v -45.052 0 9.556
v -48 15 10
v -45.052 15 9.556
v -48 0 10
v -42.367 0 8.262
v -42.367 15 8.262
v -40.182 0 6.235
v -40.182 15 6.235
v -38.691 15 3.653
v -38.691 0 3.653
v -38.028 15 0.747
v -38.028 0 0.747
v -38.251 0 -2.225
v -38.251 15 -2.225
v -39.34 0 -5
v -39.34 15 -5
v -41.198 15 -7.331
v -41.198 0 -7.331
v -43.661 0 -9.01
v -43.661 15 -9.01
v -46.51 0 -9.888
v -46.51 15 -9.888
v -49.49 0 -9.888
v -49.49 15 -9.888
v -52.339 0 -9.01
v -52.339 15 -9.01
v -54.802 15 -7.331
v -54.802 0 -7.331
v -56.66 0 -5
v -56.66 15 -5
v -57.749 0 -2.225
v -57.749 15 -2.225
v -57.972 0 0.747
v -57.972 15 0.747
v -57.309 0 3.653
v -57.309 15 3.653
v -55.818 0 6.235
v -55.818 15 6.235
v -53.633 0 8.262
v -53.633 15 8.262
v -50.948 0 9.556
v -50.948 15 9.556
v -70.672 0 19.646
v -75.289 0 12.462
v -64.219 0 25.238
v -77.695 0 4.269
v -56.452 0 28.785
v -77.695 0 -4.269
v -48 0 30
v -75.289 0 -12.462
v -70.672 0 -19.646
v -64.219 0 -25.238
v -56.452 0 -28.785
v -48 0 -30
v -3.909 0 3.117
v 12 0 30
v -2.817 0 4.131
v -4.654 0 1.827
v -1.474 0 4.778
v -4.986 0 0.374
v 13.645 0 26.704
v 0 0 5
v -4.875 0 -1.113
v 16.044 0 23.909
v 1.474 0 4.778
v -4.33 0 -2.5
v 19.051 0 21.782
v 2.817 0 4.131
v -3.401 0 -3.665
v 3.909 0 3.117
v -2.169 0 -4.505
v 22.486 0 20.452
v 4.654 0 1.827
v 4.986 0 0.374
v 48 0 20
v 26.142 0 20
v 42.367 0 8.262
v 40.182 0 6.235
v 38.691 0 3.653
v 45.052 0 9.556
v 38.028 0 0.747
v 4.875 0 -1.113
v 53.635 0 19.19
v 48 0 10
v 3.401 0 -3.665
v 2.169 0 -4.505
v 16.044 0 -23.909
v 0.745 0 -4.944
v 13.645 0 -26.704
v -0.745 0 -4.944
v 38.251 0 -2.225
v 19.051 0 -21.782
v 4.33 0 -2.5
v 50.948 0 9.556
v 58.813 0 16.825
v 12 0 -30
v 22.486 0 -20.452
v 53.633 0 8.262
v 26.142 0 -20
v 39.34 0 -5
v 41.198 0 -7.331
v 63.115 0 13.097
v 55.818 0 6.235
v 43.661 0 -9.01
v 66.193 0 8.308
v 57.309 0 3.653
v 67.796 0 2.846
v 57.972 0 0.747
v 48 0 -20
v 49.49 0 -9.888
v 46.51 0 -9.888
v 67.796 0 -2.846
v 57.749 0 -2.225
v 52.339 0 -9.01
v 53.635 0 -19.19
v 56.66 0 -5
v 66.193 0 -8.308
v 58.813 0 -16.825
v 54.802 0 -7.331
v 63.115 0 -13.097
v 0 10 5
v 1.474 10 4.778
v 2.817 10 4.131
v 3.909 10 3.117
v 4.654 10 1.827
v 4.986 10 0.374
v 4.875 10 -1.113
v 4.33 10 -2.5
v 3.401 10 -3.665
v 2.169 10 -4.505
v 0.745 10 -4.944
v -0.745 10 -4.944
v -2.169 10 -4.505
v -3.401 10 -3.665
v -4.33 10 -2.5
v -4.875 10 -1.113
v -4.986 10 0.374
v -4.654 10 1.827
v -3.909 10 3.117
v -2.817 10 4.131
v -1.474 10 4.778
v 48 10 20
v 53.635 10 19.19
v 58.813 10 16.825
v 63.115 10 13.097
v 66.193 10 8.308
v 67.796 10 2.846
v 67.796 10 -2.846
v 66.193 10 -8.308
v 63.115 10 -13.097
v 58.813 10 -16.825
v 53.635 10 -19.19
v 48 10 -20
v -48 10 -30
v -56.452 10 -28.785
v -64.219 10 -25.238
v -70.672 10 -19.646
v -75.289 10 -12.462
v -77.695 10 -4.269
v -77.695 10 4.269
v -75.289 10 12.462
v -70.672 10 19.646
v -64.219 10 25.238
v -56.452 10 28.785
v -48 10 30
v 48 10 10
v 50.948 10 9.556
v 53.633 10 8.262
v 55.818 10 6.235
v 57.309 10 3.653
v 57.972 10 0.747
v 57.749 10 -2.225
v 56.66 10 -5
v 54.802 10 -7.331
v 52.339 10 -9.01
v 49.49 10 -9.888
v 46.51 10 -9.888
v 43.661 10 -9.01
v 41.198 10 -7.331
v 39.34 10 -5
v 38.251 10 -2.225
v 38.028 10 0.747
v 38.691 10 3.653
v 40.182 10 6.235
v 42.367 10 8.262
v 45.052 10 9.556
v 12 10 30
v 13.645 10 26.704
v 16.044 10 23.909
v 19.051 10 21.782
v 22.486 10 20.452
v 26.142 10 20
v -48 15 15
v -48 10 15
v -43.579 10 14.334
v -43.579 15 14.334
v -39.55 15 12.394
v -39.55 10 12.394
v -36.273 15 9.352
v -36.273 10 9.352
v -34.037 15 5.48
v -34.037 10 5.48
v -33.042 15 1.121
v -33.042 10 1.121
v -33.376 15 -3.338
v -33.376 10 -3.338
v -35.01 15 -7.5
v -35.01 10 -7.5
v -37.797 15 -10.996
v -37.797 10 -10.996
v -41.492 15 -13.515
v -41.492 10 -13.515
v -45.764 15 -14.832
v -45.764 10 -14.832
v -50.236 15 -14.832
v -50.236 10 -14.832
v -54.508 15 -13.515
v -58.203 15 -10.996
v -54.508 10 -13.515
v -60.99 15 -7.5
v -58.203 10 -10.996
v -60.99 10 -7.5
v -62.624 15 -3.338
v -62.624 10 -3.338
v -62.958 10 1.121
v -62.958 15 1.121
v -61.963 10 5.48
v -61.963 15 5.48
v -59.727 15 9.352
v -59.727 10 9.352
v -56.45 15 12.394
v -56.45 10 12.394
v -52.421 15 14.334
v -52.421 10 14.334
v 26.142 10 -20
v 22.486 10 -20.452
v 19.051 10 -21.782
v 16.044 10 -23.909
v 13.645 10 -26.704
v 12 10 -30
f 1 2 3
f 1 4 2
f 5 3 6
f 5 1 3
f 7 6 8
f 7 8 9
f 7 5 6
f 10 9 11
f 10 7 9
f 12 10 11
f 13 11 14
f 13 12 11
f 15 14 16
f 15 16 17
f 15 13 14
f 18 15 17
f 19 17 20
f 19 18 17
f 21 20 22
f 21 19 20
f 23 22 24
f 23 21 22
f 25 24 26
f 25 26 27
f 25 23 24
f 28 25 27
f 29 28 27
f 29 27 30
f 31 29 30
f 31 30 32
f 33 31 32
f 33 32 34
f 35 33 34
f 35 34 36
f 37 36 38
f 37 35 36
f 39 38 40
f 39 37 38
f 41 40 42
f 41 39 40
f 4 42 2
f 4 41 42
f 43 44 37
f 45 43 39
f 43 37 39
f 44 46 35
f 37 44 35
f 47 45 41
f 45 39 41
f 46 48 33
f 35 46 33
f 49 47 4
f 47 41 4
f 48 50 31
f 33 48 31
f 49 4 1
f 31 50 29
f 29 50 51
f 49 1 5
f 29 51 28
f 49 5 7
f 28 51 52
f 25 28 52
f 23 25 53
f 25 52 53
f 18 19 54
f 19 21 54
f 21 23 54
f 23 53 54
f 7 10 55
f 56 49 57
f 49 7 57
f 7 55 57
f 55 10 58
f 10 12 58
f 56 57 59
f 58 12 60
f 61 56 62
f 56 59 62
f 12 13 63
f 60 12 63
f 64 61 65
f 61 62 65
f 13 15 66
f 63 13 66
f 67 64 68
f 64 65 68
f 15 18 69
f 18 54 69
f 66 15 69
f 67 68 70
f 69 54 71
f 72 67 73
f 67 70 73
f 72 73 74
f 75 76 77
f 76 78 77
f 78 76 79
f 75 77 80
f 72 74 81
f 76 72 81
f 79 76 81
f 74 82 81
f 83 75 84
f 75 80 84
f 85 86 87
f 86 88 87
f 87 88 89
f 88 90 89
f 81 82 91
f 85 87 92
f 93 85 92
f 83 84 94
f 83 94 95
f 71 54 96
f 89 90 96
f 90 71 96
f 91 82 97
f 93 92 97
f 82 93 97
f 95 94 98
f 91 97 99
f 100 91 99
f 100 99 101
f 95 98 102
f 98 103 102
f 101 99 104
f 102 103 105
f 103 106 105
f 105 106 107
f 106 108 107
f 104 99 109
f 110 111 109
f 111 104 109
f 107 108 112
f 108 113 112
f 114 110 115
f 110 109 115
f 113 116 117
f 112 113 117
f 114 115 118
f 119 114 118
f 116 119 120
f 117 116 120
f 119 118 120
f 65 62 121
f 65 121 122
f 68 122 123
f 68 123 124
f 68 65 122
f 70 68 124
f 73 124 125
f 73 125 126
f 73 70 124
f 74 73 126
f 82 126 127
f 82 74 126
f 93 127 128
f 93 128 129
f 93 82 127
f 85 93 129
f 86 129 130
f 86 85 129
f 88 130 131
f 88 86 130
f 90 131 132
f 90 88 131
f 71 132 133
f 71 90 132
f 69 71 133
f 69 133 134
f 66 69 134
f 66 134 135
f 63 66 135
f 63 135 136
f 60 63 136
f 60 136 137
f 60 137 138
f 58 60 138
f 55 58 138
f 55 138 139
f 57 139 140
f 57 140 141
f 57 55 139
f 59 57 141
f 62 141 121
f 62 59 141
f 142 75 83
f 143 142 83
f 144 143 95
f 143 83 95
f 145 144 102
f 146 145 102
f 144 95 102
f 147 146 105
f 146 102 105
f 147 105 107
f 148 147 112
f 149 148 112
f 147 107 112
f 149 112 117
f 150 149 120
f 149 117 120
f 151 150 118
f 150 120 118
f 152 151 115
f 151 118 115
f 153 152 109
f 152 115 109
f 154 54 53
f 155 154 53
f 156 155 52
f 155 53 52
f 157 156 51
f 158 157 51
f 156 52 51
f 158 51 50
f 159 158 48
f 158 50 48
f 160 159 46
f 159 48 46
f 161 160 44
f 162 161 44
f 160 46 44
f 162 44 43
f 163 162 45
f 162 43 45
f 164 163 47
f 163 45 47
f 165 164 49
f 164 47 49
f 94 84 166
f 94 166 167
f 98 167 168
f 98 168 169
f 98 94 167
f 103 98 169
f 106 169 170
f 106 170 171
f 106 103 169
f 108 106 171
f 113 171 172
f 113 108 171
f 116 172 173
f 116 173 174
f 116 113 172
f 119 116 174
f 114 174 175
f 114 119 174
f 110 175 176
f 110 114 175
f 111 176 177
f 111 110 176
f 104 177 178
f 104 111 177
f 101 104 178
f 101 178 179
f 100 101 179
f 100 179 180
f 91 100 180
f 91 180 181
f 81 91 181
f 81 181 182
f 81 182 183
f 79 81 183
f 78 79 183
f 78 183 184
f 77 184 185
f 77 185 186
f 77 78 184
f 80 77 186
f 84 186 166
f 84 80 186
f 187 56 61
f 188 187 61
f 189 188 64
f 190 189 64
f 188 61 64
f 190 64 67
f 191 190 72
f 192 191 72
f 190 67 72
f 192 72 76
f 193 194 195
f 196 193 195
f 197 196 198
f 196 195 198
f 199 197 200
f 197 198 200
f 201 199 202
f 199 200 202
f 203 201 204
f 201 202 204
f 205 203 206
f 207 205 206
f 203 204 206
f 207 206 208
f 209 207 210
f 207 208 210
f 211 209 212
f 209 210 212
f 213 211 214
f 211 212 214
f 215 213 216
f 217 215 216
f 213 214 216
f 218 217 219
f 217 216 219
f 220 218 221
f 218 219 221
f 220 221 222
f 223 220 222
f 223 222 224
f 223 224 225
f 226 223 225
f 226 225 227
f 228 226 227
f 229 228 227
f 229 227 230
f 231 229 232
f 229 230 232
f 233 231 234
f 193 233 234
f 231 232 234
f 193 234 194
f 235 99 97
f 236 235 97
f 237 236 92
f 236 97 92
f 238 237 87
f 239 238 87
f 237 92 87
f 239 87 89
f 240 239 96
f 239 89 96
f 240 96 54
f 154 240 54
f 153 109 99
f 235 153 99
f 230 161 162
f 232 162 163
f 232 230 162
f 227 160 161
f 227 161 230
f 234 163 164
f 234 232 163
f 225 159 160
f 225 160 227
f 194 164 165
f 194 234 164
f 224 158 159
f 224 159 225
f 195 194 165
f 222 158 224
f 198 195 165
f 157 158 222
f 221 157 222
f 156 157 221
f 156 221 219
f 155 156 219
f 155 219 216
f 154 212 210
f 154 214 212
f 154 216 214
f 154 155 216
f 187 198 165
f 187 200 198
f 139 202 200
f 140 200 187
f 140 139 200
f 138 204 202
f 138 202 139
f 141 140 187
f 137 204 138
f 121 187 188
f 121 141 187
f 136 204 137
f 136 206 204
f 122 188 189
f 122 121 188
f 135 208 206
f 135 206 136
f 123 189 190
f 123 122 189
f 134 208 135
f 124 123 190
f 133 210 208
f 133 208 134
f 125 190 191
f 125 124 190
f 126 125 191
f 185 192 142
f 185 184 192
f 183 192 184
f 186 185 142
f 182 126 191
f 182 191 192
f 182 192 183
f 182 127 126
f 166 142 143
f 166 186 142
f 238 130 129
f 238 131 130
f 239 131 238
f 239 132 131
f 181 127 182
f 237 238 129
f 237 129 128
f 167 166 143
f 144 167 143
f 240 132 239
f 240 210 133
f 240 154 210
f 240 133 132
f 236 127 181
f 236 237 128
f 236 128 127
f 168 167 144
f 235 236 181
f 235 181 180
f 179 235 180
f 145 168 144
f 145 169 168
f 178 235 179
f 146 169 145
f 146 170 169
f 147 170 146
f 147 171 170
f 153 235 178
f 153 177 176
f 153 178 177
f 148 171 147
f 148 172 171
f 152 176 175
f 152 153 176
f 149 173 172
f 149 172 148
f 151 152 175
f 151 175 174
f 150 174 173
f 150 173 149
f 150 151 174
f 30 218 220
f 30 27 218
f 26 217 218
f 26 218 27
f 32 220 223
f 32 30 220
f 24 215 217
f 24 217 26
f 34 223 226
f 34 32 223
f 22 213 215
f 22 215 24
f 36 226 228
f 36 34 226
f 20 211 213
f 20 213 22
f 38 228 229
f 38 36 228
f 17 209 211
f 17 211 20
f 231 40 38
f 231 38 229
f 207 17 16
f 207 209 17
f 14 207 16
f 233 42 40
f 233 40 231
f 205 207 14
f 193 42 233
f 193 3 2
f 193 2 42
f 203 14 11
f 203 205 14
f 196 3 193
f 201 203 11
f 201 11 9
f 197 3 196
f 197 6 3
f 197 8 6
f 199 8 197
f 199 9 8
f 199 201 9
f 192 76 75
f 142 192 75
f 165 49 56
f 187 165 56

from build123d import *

# Parameters (mm, degrees)
SKETCH1_R           = 5
SKETCH1_R_2         = 10
BOSS_EXTRUDE1_DEPTH = 10
SKETCH2_R           = 15
SKETCH2_R_2         = 10
BOSS_EXTRUDE2_DEPTH = 5


with BuildPart() as part:
    # Sketch1 → Boss-Extrude1 (new body)
    with BuildSketch(Plane(origin=(0, 0, 0), x_dir=(1, 0, 0), z_dir=(0, 1, 0))):
        with BuildLine():
            Line((12, 30), (-48, 30))
            ThreePointArc((-48, 30), (-78, 0), (-48, -30))
            Line((-48, -30), (12, -30))
            ThreePointArc((12, -30), (17.481881586, -22.752551286), (26.142135624, -20))
            Line((26.142135624, -20), (48, -20))
            ThreePointArc((48, -20), (68, 0), (48, 20))
            Line((48, 20), (26.142135624, 20))
            ThreePointArc((26.142135624, 20), (17.481881586, 22.752551286), (12, 30))
        make_face()
        with Locations(Location((0, 0, 0), (0, 0, 270))):  # turned: the seam where the file's is
            Circle(SKETCH1_R, mode=Mode.SUBTRACT)
        with Locations(Location((-48, 0, 0), (0, 0, 270))):  # turned: the seam where the file's is
            Circle(SKETCH1_R_2, mode=Mode.SUBTRACT)
        with Locations(Location((48, 0, 0), (0, 0, 270))):  # turned: the seam where the file's is
            Circle(SKETCH1_R_2, mode=Mode.SUBTRACT)
    extrude(amount=BOSS_EXTRUDE1_DEPTH)

    # Sketch2 → Boss-Extrude2 (add)
    with BuildSketch(Plane(origin=(0, 10, 0), x_dir=(1, 0, 0), z_dir=(0, 1, 0))):
        with Locations(Location((-48, 0, 0), (0, 0, 270))):  # turned: the seam where the file's is
            Circle(SKETCH2_R)
        with Locations(Location((-48, 0, 0), (0, 0, 270))):  # turned: the seam where the file's is
            Circle(SKETCH2_R_2, mode=Mode.SUBTRACT)
    extrude(amount=BOSS_EXTRUDE2_DEPTH)


solid = part.part
